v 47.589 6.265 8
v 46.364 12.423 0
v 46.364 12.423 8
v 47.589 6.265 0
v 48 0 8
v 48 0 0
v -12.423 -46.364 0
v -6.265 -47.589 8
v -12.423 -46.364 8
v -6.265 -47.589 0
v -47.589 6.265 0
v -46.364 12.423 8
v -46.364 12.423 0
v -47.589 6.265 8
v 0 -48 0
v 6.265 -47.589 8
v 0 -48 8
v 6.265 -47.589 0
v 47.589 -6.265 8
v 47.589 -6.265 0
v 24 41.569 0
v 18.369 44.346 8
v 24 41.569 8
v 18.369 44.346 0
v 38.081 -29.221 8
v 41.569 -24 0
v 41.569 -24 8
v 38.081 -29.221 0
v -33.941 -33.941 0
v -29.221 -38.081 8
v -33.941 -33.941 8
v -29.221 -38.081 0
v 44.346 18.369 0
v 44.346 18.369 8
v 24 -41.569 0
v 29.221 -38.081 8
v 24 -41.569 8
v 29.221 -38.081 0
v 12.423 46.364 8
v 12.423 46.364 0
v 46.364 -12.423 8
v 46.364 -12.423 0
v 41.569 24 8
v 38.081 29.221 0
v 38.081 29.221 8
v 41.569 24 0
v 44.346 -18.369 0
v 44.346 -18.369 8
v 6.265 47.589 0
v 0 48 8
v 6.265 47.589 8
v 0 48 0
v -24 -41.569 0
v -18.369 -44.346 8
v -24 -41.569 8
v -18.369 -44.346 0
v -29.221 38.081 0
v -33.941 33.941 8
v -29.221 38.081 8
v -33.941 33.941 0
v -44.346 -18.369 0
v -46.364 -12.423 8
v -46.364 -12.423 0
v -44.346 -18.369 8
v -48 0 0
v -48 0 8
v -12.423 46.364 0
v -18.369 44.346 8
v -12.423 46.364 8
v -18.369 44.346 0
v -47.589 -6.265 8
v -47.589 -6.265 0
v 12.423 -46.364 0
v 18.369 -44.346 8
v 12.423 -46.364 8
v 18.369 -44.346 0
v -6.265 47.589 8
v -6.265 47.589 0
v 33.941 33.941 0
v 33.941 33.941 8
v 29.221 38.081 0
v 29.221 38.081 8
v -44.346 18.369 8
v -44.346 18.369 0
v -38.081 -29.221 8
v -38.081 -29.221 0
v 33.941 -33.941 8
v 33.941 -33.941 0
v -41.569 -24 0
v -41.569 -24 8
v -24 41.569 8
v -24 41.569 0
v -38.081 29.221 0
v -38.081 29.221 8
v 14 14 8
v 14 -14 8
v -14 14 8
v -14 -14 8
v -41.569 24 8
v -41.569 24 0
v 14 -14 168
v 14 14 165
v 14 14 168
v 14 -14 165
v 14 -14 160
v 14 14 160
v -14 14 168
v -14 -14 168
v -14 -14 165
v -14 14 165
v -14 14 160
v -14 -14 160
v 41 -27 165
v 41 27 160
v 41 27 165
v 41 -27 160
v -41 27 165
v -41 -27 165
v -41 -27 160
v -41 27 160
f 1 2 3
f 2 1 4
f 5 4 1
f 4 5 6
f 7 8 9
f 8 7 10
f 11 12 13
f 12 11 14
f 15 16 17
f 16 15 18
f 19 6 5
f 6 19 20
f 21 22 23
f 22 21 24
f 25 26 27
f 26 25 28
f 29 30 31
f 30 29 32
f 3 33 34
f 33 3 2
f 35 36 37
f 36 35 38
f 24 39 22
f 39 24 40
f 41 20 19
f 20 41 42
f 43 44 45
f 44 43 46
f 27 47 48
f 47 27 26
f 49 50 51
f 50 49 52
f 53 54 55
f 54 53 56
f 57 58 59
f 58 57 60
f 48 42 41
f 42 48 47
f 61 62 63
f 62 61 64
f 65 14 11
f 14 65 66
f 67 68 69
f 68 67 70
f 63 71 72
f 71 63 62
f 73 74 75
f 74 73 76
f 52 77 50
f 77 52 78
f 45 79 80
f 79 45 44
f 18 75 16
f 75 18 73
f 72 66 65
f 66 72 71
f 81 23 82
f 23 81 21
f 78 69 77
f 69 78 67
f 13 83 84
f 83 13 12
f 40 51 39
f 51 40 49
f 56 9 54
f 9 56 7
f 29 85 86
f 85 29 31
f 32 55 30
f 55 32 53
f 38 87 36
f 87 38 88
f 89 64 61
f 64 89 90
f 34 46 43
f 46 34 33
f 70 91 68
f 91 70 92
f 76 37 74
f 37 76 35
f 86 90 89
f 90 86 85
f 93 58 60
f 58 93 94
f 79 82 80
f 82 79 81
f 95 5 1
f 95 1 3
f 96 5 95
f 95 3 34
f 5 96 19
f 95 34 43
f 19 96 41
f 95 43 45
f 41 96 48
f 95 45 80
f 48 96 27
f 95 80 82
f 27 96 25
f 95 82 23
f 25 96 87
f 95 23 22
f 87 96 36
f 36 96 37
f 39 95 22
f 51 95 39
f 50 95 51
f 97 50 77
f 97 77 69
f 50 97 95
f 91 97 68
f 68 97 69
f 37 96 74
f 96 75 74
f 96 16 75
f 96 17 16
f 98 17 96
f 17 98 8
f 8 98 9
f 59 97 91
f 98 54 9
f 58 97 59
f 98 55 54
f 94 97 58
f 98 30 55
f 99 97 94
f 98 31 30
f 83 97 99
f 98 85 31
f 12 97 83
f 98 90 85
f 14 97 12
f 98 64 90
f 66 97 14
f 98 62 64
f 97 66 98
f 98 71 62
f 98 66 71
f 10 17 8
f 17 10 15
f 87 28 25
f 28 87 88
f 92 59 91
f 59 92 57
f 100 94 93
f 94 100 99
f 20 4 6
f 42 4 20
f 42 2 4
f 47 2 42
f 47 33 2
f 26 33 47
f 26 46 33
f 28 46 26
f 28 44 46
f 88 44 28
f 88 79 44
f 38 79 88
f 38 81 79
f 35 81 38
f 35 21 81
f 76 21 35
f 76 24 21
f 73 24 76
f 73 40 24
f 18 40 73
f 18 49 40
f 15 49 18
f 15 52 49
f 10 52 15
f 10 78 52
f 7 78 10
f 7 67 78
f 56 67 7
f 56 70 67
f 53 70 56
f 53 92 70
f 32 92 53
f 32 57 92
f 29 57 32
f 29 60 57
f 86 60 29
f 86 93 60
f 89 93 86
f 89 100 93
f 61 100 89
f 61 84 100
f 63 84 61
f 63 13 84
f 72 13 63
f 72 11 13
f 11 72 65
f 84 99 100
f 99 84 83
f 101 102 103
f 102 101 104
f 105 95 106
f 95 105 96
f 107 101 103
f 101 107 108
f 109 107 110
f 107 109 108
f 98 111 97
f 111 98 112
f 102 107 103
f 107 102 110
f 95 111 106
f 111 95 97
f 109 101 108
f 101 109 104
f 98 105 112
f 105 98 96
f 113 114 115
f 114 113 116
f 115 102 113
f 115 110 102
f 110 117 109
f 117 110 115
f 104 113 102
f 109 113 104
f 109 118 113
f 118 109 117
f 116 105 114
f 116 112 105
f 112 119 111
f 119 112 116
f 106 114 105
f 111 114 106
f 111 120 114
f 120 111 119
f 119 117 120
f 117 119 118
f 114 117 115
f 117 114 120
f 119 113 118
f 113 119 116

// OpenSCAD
// Synthetic Forma demo geometry — NOT production CAD.
$fn = 48;
cylinder(h=8, r=48);
translate([-14,-14,8]) cube([28,28,160]);
translate([-41,-27,160]) cube([82,54,5]);
